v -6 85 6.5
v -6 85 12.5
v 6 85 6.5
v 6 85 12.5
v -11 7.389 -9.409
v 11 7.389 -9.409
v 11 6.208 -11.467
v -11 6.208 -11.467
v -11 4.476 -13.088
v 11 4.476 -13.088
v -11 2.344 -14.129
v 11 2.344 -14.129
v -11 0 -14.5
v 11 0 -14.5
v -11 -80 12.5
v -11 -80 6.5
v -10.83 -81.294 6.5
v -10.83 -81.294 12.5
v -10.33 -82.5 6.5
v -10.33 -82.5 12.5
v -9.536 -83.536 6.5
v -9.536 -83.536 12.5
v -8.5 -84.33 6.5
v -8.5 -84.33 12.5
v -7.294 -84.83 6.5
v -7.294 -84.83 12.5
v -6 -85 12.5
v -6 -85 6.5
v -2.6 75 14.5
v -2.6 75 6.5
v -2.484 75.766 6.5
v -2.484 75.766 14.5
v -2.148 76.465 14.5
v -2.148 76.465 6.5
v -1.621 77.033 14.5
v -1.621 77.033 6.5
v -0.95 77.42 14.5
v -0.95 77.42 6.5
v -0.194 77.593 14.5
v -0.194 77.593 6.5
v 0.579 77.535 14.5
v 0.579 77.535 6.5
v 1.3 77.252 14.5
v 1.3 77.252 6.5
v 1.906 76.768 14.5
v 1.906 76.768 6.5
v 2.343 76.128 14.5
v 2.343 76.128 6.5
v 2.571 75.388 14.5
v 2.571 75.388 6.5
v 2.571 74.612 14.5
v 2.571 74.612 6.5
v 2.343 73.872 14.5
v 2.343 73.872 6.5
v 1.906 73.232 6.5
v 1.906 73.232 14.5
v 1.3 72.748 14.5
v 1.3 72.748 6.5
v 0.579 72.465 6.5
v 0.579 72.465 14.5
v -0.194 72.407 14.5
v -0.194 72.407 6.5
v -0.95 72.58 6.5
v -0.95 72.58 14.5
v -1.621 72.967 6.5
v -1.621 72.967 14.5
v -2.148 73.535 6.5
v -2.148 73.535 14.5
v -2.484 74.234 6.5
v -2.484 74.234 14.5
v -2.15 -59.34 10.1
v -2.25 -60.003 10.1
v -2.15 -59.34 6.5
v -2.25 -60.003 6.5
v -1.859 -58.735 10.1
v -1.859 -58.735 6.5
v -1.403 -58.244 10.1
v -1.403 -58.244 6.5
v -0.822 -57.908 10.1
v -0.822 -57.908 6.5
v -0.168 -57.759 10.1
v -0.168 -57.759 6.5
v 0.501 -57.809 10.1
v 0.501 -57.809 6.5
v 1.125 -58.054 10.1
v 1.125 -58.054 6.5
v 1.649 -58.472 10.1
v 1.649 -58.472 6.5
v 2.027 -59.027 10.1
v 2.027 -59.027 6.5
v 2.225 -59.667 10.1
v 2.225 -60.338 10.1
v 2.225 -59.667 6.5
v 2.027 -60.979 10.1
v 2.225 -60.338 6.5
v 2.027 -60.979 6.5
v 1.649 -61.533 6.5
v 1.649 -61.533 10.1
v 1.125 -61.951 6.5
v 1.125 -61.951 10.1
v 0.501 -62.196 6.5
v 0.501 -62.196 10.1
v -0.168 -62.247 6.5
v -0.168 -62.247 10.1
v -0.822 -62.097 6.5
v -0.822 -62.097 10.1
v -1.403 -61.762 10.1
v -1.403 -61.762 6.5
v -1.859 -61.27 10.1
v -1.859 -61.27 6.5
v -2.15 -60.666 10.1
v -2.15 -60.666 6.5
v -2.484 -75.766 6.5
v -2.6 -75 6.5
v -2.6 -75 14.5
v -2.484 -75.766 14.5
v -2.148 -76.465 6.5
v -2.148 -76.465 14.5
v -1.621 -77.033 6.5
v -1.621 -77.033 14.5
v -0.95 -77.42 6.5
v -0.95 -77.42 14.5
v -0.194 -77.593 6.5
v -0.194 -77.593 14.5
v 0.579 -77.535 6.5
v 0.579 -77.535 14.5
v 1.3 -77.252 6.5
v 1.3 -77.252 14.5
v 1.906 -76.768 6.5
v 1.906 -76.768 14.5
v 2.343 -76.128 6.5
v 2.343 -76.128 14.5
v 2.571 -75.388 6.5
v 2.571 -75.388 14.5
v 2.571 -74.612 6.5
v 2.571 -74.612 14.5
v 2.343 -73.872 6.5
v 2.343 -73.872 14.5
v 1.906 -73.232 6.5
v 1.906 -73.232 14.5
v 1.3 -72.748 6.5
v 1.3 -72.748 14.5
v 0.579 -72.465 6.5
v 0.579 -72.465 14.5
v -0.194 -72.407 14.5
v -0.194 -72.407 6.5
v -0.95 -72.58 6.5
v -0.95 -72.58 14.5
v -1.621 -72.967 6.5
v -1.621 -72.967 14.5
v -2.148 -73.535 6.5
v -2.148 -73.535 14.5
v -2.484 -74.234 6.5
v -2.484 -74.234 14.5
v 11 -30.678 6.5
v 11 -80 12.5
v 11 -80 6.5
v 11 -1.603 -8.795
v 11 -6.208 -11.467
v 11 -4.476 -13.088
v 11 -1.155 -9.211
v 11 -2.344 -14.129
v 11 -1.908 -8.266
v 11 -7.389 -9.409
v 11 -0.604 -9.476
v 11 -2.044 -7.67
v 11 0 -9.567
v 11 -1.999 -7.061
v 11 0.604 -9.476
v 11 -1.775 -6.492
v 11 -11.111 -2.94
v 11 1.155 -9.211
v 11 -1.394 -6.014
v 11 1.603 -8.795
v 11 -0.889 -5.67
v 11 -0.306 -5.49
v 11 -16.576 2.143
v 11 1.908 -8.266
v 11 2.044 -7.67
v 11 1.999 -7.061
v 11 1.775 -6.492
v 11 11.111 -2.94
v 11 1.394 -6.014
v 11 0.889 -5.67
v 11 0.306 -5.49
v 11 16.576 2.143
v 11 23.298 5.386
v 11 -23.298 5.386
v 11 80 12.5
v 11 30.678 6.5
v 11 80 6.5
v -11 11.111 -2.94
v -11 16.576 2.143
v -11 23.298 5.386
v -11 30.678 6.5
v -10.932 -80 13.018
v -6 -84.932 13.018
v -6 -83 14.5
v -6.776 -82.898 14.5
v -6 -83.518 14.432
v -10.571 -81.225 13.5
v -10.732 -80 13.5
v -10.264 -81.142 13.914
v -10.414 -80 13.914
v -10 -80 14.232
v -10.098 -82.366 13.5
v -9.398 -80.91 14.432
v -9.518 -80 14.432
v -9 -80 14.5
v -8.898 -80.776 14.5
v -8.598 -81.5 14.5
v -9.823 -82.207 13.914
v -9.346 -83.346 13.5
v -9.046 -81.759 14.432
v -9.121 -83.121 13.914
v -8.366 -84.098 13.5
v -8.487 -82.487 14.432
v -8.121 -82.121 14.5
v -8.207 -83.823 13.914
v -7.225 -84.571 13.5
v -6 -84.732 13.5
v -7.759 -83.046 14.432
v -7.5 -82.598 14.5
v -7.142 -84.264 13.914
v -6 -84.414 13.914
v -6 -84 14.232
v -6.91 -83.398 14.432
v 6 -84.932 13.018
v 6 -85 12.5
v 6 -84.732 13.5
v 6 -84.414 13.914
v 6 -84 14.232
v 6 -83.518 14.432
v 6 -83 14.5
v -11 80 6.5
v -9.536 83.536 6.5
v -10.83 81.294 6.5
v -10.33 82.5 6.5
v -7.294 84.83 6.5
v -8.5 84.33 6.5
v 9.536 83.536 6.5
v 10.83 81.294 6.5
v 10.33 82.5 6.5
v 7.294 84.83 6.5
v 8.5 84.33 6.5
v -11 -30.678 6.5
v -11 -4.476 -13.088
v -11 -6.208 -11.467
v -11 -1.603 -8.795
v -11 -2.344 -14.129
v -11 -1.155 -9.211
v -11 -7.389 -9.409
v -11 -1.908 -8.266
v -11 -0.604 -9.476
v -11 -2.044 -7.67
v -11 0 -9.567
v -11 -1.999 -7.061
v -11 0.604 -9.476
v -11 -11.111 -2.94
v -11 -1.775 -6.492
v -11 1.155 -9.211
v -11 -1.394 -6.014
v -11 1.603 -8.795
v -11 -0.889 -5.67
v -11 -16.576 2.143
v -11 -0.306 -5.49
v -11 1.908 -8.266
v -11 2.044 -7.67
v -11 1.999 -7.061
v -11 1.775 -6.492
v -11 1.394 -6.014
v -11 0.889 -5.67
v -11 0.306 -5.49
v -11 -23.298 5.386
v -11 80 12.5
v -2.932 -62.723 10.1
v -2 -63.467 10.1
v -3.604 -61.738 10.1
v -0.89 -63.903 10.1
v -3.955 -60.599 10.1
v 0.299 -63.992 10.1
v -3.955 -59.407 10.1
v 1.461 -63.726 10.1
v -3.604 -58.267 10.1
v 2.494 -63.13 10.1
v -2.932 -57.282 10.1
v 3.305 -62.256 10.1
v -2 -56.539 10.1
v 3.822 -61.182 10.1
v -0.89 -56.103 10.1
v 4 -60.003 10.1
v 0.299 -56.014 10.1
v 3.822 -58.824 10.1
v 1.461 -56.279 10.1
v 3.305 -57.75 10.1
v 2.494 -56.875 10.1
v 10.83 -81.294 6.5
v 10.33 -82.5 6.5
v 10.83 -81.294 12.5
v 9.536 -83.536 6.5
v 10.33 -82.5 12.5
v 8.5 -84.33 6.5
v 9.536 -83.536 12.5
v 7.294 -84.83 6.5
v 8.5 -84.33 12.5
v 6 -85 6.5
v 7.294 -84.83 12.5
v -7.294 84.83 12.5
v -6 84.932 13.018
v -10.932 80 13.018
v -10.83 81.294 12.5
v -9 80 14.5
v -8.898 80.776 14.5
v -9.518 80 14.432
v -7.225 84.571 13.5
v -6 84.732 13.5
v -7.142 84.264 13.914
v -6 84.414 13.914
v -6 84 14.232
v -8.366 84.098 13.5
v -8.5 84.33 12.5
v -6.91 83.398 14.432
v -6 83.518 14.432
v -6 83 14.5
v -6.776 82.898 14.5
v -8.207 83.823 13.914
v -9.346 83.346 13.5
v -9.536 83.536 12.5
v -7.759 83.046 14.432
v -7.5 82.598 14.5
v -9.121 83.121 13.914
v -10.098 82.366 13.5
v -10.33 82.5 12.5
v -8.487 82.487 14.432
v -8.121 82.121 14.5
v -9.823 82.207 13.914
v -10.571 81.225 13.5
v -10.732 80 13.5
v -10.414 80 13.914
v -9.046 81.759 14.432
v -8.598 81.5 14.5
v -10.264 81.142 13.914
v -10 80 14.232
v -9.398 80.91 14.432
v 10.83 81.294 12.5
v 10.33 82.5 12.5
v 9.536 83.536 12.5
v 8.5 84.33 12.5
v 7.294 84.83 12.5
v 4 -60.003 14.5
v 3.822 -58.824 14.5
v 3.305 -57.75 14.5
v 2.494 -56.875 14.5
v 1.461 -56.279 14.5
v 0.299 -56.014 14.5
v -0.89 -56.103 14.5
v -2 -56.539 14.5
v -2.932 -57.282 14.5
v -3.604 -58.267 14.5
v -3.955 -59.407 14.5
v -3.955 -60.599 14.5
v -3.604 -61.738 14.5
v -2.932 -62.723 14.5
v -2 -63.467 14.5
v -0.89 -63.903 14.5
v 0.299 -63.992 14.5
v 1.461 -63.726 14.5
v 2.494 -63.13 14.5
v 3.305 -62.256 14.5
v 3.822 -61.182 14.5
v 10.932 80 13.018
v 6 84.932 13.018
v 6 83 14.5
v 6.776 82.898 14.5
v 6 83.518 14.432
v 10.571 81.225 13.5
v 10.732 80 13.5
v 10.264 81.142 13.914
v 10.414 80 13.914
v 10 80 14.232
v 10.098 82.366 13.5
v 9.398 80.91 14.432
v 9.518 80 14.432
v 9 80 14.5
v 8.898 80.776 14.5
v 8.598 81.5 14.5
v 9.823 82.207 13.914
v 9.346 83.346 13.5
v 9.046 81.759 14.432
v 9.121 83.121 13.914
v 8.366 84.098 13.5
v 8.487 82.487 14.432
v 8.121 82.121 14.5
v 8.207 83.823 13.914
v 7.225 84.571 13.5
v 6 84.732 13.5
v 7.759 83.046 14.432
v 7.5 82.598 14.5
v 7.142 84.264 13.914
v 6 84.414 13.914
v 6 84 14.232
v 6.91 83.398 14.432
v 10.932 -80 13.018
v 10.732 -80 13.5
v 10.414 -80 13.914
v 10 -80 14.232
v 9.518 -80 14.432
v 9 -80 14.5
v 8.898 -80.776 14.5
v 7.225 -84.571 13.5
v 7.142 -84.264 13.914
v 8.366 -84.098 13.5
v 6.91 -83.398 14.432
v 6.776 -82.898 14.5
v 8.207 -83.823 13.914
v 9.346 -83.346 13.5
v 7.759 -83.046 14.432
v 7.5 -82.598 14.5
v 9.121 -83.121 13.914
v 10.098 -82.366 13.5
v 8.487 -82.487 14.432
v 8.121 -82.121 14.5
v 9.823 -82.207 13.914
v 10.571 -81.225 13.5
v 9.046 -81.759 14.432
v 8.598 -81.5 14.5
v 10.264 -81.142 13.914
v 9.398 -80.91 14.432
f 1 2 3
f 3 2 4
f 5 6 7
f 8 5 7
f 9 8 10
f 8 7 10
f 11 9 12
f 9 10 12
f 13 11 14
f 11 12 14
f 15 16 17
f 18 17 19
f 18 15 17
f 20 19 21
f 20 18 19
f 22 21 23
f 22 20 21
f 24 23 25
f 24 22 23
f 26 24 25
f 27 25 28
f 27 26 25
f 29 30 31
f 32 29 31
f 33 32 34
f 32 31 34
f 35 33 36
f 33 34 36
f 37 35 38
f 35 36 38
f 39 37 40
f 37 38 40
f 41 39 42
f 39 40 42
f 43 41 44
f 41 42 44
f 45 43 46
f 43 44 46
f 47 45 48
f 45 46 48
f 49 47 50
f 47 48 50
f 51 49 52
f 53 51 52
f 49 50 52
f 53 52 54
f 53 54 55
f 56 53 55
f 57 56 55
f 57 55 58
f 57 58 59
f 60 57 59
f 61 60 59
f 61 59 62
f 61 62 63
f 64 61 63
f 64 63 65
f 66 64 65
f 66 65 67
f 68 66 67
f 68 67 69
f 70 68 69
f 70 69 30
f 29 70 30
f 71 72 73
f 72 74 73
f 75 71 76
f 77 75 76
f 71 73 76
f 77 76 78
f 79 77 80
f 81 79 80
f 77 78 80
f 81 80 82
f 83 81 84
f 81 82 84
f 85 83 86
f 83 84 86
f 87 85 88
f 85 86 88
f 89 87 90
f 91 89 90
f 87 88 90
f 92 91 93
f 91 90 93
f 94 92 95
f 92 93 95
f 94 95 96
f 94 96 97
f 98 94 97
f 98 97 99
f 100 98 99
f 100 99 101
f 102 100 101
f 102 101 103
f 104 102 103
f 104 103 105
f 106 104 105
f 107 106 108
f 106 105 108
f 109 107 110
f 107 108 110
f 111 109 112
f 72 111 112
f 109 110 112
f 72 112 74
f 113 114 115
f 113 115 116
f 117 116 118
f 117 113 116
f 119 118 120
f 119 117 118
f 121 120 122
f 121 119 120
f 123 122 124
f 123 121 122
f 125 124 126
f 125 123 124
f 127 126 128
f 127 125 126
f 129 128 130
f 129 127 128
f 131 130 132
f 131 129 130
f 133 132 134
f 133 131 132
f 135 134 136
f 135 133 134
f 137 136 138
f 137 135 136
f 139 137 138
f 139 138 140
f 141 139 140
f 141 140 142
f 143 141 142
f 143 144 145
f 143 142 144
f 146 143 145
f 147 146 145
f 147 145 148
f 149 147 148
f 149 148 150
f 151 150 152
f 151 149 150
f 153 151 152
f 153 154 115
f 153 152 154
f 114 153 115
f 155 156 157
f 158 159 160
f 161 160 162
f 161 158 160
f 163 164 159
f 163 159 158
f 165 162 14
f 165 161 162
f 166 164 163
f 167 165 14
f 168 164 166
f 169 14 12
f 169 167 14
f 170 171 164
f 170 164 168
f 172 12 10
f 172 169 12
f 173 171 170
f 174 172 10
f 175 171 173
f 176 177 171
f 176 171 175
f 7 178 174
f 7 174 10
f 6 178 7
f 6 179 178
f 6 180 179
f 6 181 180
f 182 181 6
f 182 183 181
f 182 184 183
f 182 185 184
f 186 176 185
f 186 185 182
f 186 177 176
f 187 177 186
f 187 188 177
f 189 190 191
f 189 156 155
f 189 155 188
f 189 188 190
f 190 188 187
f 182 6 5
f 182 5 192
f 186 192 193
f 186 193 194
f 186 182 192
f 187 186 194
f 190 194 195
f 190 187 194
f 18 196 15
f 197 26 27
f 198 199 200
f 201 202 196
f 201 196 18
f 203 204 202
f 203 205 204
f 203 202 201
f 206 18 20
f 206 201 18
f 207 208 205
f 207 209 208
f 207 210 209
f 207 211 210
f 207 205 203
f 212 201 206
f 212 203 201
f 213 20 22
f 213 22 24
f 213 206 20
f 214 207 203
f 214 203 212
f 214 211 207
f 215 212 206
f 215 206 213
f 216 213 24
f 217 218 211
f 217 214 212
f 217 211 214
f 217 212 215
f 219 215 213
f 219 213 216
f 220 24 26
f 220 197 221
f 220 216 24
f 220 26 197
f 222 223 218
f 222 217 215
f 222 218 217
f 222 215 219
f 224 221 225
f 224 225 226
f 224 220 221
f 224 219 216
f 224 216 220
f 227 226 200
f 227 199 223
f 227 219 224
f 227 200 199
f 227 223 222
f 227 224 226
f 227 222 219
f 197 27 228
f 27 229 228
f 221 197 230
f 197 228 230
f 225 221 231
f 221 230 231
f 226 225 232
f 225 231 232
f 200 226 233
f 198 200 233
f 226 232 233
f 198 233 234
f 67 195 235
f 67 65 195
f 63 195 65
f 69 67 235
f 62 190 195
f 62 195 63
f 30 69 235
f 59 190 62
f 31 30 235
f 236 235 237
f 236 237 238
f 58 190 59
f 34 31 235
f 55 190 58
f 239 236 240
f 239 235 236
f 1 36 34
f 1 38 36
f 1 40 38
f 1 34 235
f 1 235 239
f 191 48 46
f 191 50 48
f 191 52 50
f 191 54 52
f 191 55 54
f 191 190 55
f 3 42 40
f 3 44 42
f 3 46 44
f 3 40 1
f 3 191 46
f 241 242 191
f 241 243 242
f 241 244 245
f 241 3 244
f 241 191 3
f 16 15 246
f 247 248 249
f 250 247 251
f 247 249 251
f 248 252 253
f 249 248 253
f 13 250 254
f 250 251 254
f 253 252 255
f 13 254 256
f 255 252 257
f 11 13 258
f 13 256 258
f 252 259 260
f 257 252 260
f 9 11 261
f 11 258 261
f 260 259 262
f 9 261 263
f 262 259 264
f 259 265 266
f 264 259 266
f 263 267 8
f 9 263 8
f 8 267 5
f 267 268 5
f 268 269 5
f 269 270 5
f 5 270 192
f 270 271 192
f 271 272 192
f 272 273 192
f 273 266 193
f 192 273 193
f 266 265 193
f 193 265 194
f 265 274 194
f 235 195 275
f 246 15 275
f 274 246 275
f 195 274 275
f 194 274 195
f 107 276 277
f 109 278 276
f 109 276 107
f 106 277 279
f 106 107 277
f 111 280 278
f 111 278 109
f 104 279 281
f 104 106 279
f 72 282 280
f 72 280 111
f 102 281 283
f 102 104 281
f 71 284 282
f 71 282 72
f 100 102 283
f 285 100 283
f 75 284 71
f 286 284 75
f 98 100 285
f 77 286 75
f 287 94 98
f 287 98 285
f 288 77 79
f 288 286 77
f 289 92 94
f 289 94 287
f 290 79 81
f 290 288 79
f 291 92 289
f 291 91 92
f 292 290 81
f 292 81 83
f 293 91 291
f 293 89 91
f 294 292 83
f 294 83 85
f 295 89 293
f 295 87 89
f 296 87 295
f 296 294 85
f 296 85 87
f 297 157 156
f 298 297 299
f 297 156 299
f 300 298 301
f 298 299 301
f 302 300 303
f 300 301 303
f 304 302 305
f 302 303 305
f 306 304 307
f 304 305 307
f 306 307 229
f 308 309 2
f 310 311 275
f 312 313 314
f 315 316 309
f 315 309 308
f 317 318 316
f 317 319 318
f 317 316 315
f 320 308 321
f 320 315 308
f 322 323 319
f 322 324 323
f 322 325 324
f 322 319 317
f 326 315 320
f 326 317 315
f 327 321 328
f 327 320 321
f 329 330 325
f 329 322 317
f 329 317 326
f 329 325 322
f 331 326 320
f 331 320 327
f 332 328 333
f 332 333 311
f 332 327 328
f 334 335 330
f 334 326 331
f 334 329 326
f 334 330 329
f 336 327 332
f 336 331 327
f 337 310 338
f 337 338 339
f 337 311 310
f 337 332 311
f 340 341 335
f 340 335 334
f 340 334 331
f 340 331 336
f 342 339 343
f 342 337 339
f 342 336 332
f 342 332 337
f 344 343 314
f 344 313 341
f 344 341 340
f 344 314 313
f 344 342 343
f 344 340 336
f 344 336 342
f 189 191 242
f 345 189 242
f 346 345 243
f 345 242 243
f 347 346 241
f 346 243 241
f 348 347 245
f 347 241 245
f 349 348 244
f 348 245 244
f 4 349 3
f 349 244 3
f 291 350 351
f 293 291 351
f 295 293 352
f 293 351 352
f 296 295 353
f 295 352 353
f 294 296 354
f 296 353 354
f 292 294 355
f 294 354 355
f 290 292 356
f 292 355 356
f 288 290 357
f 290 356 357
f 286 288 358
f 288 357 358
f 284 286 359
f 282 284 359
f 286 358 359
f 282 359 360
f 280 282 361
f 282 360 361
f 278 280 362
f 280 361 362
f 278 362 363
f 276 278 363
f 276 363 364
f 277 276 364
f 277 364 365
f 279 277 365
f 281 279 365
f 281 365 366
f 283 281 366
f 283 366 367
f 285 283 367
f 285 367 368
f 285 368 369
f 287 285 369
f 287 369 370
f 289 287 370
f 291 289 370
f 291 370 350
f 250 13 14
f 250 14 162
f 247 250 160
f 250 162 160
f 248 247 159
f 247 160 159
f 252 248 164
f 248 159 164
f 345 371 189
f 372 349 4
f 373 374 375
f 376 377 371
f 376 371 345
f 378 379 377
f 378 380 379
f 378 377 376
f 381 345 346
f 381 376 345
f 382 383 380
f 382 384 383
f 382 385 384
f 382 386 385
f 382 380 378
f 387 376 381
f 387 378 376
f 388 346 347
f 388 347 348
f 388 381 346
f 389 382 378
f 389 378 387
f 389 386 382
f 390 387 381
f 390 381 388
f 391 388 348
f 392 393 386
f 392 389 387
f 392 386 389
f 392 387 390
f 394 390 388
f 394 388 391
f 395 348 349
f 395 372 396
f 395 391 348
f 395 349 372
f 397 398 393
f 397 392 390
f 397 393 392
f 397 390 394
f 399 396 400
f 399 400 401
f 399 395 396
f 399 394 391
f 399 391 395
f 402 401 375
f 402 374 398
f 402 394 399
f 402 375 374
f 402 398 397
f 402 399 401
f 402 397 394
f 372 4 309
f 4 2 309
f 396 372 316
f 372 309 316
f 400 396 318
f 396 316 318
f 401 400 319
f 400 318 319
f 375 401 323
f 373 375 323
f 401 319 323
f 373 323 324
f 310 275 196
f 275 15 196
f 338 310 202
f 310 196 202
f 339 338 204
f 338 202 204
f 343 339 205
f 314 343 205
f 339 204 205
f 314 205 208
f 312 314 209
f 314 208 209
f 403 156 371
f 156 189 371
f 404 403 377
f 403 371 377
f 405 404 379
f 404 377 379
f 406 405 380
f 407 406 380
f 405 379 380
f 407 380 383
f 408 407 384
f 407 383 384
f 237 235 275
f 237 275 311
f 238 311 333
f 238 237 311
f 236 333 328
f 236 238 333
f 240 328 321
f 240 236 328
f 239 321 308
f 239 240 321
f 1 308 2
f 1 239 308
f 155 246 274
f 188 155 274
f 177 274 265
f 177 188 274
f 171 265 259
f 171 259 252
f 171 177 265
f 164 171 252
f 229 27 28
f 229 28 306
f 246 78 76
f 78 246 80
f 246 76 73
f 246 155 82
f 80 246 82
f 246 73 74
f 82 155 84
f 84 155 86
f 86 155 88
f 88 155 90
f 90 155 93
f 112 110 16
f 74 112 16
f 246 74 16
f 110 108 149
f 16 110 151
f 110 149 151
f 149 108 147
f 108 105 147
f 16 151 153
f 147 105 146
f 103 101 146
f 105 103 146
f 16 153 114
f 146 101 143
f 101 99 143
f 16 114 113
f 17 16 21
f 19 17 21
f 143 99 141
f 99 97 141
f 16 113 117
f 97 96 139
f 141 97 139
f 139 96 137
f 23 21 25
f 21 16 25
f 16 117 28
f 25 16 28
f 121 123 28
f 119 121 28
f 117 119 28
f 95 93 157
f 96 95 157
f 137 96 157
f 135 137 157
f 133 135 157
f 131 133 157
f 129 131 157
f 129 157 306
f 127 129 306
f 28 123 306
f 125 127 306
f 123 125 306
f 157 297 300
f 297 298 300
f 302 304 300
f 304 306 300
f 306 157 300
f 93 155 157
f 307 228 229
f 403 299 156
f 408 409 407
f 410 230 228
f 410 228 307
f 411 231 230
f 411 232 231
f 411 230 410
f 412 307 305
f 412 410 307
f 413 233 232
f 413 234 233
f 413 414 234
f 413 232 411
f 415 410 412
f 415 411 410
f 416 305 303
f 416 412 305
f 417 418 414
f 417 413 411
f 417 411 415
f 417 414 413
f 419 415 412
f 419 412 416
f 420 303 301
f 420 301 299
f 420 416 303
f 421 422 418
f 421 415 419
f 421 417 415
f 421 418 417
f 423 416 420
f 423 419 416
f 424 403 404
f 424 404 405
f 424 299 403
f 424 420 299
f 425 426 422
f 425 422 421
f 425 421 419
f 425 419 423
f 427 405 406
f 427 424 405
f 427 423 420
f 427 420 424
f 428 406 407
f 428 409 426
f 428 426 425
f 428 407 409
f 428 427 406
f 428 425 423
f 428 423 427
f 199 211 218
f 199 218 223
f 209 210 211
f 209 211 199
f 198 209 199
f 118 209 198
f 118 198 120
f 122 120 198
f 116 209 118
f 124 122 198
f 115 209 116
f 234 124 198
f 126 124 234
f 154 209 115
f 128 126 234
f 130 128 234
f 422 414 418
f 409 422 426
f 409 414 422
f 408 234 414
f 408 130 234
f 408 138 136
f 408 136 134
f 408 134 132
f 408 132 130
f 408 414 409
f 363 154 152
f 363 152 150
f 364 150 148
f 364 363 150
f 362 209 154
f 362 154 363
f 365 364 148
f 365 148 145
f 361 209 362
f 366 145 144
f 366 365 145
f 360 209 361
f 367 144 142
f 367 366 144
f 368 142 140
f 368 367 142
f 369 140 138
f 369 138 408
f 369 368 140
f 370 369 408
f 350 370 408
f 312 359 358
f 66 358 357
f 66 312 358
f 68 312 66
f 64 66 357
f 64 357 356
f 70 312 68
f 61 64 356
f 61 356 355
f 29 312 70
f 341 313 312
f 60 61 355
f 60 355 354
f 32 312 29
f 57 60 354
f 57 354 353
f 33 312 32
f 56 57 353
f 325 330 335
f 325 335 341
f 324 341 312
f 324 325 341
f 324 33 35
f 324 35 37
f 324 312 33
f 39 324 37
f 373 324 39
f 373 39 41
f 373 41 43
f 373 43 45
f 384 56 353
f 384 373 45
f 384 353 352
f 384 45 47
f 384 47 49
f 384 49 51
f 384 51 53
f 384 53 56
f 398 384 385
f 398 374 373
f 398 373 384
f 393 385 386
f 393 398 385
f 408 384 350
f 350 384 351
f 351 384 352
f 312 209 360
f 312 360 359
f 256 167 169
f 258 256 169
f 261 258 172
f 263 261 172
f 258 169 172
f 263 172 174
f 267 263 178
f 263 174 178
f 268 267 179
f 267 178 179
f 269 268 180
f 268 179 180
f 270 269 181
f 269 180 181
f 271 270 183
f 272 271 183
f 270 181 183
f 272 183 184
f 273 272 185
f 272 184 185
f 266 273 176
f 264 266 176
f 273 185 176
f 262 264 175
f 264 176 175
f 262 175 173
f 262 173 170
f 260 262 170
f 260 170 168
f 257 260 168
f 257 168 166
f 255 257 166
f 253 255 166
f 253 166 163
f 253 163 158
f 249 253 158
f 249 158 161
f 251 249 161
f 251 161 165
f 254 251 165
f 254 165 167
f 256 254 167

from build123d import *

# Parameters (mm, degrees)
SKETCH1_W                                           = 22
SKETCH1_H                                           = 170
BOSS_EXTRUDE1_DEPTH                                 = 14.5
SKETCH2_W                                           = 21
SKETCH2_H                                           = 79
CUT_EXTRUDE1_DEPTH                                  = 89.990167996
FILLET3_R                                           = 25
FILLET1_R                                           = 5
FILLET2_R                                           = 2
FILLET4_R                                           = 8
TAPPED_HOLE_FOR_M5X0_8_HELICOIL1_D                  = 5.2
CBORE_FOR_M4_HEX_SOCKET_HEAD_CAP_SCREW1_D           = 4.5
CBORE_FOR_M4_HEX_SOCKET_HEAD_CAP_SCREW1_CBORE_D     = 8
CBORE_FOR_M4_HEX_SOCKET_HEAD_CAP_SCREW1_CBORE_DEPTH = 4.4
SKETCH9_R                                           = 2.05
CUT_EXTRUDE2_DEPTH                                  = 89.990167996


with BuildPart() as part:
    # Sketch1 → Boss-Extrude1 (new, symmetric)
    with BuildSketch(Plane.XY):
        Rectangle(SKETCH1_W, SKETCH1_H)
    extrude(amount=BOSS_EXTRUDE1_DEPTH, both=True)

    # Sketch2 → Cut-Extrude1 (cut, through all)
    with BuildSketch(Plane(origin=(11, 0, 0), x_dir=(0, 0, -1), z_dir=(1, 0, 0))):
        with Locations((4, 45.5)):
            Rectangle(SKETCH2_W, SKETCH2_H)
    cut_extrude1 = extrude(amount=-CUT_EXTRUDE1_DEPTH, mode=Mode.SUBTRACT)

    # Mirror1: Cut-Extrude1 across plane
    add(cut_extrude1.mirror(Plane.ZX), mode=Mode.SUBTRACT)

    # Fillet3
    # the kernel refuses this fillet: 25 mm, written as the material it adds along each edge
    with BuildSketch(Plane(origin=(11, 6, 6.5), x_dir=(0, 0, -1), z_dir=(-1, 0, 0))) as fillet3_piece_1:
        with BuildLine():
            CenterArc((25, -24.677925359), FILLET3_R, 99.206896221, 80.793103779)
            Line((0, -24.677925359), (-0.5, -24.677925359))
            Line((-0.5, -24.677925359), (-0.5, 0))
            Line((-0.5, 0), (0, 0.5))
            ThreePointArc((0, 0.5), (10.5, 0.5), (20.92, 0.493558507))
            Line((20.92, 0.493558507), (21, 0))
        make_face()
    extrude(amount=22)
    with BuildSketch(Plane(origin=(11, -6, 6.5), x_dir=(0, -1, 0), z_dir=(-1, 0, 0))) as fillet3_piece_2:
        with BuildLine():
            CenterArc((24.677925359, -25), FILLET3_R, 90, 80.793103779)
            Line((0, -21), (-0.493558507, -20.92))
            ThreePointArc((-0.493558507, -20.92), (-0.5, -10.5), (-0.5, 0))
            Line((-0.5, 0), (0, 0.5))
            Line((0, 0.5), (24.677925359, 0.5))
            Line((24.677925359, 0.5), (24.677925359, 0))
        make_face()
    extrude(amount=22)

    # Fillet1
    fillet1_edges = [part.edges().sort_by_distance(p)[0] for p in [
        (11, -85, 10.5),
        (-11, -85, 10.5),
        (-11, 85, 10.5),
        (11, 85, 10.5),
    ]]
    fillet(fillet1_edges, radius=FILLET1_R)

    # Fillet2
    fillet2_edges = [part.edges().sort_by_distance(p)[0] for p in [
        (11, 0, 14.5),
        (0, -85, 14.5),
        (0, 85, 14.5),
        (-11, 0, 14.5),
        (9.535533906, 83.535533906, 14.5),
        (-9.535533906, 83.535533906, 14.5),
        (-9.535533906, -83.535533906, 14.5),
        (9.535533906, -83.535533906, 14.5),
    ]]
    fillet(fillet2_edges, radius=FILLET2_R)

    # Fillet4
    # the kernel refuses this fillet: 8 mm, written as the material it takes off along each edge
    with BuildSketch(Plane(origin=(26.157317348, -6, -14.5), x_dir=(0, 1, 0), z_dir=(-1, 0, 0))) as fillet4_piece_1:
        with BuildLine():
            CenterArc((6.062926939, -8), FILLET4_R, 90, 68.676313737)
            ThreePointArc((-1.38940089, -5.090909091), (-0.559998083, -2.582217249), (0, 0))
            Line((0, 0), (6.062926939, 0))
        make_face()
    extrude(amount=52.314634697, mode=Mode.SUBTRACT)
    with BuildSketch(Plane(origin=(26.157317348, 6, -14.5), x_dir=(0, 0.2632886899666048, 0.96471709103533), z_dir=(-1, 0, 0))) as fillet4_piece_2:
        with BuildLine():
            CenterArc((6.121436637, -7.95531876), FILLET4_R, 96.058395021, 68.676313736)
            Line((-1.596300091, -5.84900924), (0, 0))
            ThreePointArc((0, 0), (2.638550275, -0.139628875), (5.277100549, 0))
        make_face()
    extrude(amount=52.314634697, mode=Mode.SUBTRACT)

    # Tapped Hole for M5x0.8 Helicoil1 (through all)
    with Locations(Plane.XY.offset(14.5)):
        with Locations((0, 75)):
            tapped_hole_for_m5x0_8_helicoil1 = Hole(TAPPED_HOLE_FOR_M5X0_8_HELICOIL1_D / 2)

    # Mirror2: Tapped Hole for M5x0.8 Helicoil1 across plane
    add(tapped_hole_for_m5x0_8_helicoil1.mirror(Plane.ZX), mode=Mode.SUBTRACT)

    # CBORE for M4 Hex Socket Head Cap Screw1 (through all)
    with Locations(Plane.XY.offset(14.5)):
        with Locations((0, -60.0028)):
            CounterBoreHole(CBORE_FOR_M4_HEX_SOCKET_HEAD_CAP_SCREW1_D / 2, CBORE_FOR_M4_HEX_SOCKET_HEAD_CAP_SCREW1_CBORE_D / 2, CBORE_FOR_M4_HEX_SOCKET_HEAD_CAP_SCREW1_CBORE_DEPTH)

    # Sketch9 → Cut-Extrude2 (cut, through all)
    with BuildSketch(Plane(origin=(11, 0, 0), x_dir=(0, 0, -1), z_dir=(1, 0, 0))):
        with Locations((7.517, 0)):
            Circle(SKETCH9_R)
    extrude(amount=-CUT_EXTRUDE2_DEPTH, mode=Mode.SUBTRACT)


solid = part.part
